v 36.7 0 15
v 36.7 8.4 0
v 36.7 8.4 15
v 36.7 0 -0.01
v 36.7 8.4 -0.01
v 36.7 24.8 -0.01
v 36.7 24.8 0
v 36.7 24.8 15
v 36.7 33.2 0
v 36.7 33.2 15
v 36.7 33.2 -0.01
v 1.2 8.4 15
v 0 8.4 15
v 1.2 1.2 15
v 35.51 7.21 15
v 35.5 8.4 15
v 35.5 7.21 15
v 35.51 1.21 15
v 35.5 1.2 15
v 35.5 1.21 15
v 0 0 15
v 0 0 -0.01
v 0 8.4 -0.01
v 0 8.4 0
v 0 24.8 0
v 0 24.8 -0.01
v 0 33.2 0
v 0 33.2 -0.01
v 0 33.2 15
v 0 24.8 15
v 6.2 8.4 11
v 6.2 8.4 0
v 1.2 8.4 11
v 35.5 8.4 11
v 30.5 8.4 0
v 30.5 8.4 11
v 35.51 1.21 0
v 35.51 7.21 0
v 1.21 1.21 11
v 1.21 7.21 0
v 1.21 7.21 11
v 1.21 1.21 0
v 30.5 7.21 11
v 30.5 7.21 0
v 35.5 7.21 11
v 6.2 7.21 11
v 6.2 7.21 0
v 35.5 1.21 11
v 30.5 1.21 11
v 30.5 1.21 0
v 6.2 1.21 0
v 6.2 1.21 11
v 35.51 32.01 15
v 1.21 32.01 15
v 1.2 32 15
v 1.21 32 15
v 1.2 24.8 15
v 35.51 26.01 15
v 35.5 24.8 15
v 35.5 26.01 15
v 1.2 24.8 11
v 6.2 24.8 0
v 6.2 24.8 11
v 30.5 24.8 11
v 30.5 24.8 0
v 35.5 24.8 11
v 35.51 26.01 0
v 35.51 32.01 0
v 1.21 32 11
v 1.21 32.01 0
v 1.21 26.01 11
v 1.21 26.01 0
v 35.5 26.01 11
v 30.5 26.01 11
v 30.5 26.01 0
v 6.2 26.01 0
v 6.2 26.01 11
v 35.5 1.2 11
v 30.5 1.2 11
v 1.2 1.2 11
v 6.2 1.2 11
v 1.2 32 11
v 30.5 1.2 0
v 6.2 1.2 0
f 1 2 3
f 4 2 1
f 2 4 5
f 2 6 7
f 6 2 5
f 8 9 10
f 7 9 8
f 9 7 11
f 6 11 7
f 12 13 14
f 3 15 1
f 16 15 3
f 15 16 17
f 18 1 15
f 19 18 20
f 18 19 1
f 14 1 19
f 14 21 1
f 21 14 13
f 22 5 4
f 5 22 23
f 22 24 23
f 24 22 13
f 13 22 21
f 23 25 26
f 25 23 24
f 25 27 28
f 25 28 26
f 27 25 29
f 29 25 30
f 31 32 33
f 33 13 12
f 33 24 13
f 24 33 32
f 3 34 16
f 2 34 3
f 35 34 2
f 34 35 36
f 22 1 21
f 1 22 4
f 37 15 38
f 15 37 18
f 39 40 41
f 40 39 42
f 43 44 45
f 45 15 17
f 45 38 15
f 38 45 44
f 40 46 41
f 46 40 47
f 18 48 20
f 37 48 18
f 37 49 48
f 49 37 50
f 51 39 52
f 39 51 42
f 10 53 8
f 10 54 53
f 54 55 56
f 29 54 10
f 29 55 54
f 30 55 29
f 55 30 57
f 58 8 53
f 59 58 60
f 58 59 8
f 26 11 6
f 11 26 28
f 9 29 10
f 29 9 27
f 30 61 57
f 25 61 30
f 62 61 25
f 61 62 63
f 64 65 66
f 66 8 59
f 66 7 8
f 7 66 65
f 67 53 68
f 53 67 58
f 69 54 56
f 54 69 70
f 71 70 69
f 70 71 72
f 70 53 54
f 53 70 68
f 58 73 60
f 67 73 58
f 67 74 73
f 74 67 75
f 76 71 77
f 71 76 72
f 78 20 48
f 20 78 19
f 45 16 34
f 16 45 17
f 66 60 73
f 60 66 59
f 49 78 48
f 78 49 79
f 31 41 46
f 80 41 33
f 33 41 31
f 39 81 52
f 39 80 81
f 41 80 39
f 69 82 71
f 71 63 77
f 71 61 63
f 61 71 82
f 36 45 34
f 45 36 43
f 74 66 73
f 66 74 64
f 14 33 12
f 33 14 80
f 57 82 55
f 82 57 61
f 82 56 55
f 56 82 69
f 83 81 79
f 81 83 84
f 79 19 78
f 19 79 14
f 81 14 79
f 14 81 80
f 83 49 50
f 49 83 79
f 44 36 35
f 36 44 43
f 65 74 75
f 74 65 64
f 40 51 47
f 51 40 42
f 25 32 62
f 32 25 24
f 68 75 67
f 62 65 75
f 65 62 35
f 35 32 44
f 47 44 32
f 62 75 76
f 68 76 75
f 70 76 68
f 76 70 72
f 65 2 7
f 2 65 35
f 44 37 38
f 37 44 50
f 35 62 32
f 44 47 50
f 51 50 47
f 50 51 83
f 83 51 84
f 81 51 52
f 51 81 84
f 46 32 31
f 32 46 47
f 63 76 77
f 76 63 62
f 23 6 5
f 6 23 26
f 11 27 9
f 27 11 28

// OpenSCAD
// file: ../Base/Rotation.scad
// Fischertechnik Box Foundation
// Geometry Helpers Rotation

include <PlacementOptions.scad>

// getRotatedSpace(space, rotation=NoRotation)
// Rotates the space dependent on the specified rotation

function getRotatedSpace(space, rotation=NoRotation) = [
    (rotation == Rotate90 || rotation == Rotate270) ? space.y : space.x,
    (rotation == Rotate90 || rotation == Rotate270) ? space.x : space.y
];

// Rotates the given space around the fixed left lower corner
// space = the space the children needs as width/depth list [width,depth]
// rotation = 0 Rotate0 degrees, 1 Rotate90 degrees, 2 Rotate180 degrees, 3 Rotate270 degrees (equivalent to -90)

module RotateFix(space, rotation=NoRotation) {
    dy = (rotation == Rotate0 || rotation == Rotate270) ? 0 :
        (rotation == Rotate90) ? space.x :
        space.y;
    dx = (rotation < Rotate180) ? 0 :
        (rotation == Rotate180) ? space.x :
        space.y;
    
    translate([dx, dy, 0])
        rotate([0, 0, rotations[rotation]])
            children();
}
// file: ../Base/Alignment.scad
// Fischertechnik Box Foundation
// Geometry Helpers Alignment

include <PlacementOptions.scad>

// getAlignedX(elementWidth, spaceWidth, align=AlignRight, offset=0)
// Gets the aligned X offset of an element with the given
// width in the given space.
// elementWidth = The width of the element to positon
// spaceWidth = The space where the element should be aligned
// align = 0 AlignLeft, 1 AlignCenter, 2 AlignRight
// offset = an optional offset from the aligned position. When
// aligned left or centered, then positive values are in X direction.
// When aligned right then positive values are in negative X direction.

function getAlignedX(elementWidth, spaceWidth, align=AlignRight, offset=0) =
    (align == AlignLeft) ?
        offset :
        ((align == AlignCenter) ?
        (spaceWidth - elementWidth)/2 + offset :
        spaceWidth - offset - elementWidth);

// getAlignedY(elementDepth, spaceDepth, align=AlignTop, offset=0)
// Gets the aligned Y offset of an element with the given
// depth in the given space.
// elementDepth = The depth of the element to positon
// spaceDepth = The space where the element should be aligned
// align = 0 AlignBottom, 1 AlignCenter, 2 AlignTop
// offset = an optional offset from the aligned position. When
// aligned bottom or centered, then positive values are in Y direction.
// When aligned top then positive values are in negative Y direction.

function getAlignedY(elementDepth, spaceDepth, align=AlignTop, offset=0) =
    (align == AlignBottom) ?
        offset :
        ((align == AlignCenter) ?
        (spaceDepth - elementDepth)/2 + offset :
        spaceDepth - offset - elementDepth);
// file: ../Base/PlacementOptions.scad
// Fischertechnik Box Foundation
// Placement Options

// Alignment
NoAlign = 0;
AlignLeft = 1;
AlignBottom = 2;
AlignCenter = 3;
AlignRight = 4;
AlignTop = 5;

// Element rotation degree steps
rotations = [0, -90, -180, -270];

// Rotation
NoRotation = 0;
Rotate0 = 0;
Rotate90 = 1;
Rotate180 = 2;
Rotate270 = 3;

// Docking (seen from above)
NoDock = -1;
DockLeft = 0;
DockTop = 1;
DockRight = 2;
DockCorner = 2;
DockBottom = 3;

// Web corners
LowerLeft = 0;
UpperLeft = 1;
UpperRight = 2;
LowerRight = 3;

// Web position relative to corner
LeftOfCorner = 0;
RightOfCorner = 1;
// file: ../Base/Boxes.scad
// Fischertechnik Box Foundation
// Pre-designed Boxes

use <Constants.scad>

include <PlacementOptions.scad>

box190Width = 190;
box190Depth = 130;
box130Width = 130;
box130Depth = 95;

// Values are from an original ec3 box
topBottomDifference = 1.5;
outerHeight = 40;
baseThickness = 1.8;
innerHeight = outerHeight - baseThickness;
stackExcess = 5.7;
radius = 3.5;
wallThickness = 1.5;
tolerance = 0.2;

boxWallThickness = wallThickness;
boxBaseThickness = baseThickness;
boxWebWidth = 3.0;

// getBoxWallThickness()
// Gets the wall thickness of a Fischertechnik Box
function getBoxWallThickness() = boxWallThickness;

// getBoxUsageHeight(height = 38.2)
// Gets the usable height of a Fischertechnik box
// height = Outer height of the box from the bottom to the upper edge.
function getBoxUsageHeight(height = outerHeight) = height - baseThickness - stackExcess;

// getBoxInnerHeight()
// Gets the inner height of a Fischertechnik box, including the stack excess
function getBoxInnerHeight() = innerHeight;

// getBoxBaseThickness()
// Gets the thickness of the Fischertechnik box base.
function getBoxBaseThickness() = boxBaseThickness;

// getBoxWebWidth()
// Gets the width of a box web
function getBoxWebWidth() = boxWebWidth;

// getBox190Space()
// Gets the usable inner space of a Box 190 as an x/y-list
function getBox190Space() = [
    box190Width - 2*getBoxWallThickness() - topBottomDifference, 
    box190Depth - 2*getBoxWallThickness() - topBottomDifference ];

// RoundedCornerPlate(width, depth, height, radius)
// Creates a body plate with rounded corners for a box. Used
// also to create the complete box with the hull module.
// width = Width of the plate
// depth = depth of the plate 
// height = thickness of the plate
// radius = radius of the rounded corner
module RoundedCornerPlate(width, depth, height, radius) {
    translate([radius, radius])
    hull() {
        w = width-2*radius;
        d = depth-2*radius;
        cube([w, d, height]);
        cylinder(height, r=radius, $fn=getFragments());
        translate([w, 0])
            cylinder(height, r=radius, $fn=getFragments());
        translate([w, d])
            cylinder(height, r=radius, $fn=getFragments());
        translate([0, d])
            cylinder(height, r=radius, $fn=getFragments());
    }
}

// BoxBase(width, depth)
// Creates an empty stackable Fischertechnik compatible box
// width = Outer width of the box (190, 130, ...)
// depth = Outer depth of the box (130, 95, ...)

module BoxBase(width, depth, height=outerHeight) {    
    thinPlate = 0.01;

    innerHeight = height - baseThickness;    
    
    module Body(tolerance=tolerance) {
        hull() {
            // Bottom with tolerance to fit into the original boxes when stacked
            translate([-wallThickness+tolerance, -wallThickness+tolerance, -baseThickness])
                RoundedCornerPlate(width-topBottomDifference-2*tolerance, depth-topBottomDifference-2*tolerance, thinPlate, radius);
            
            // Top
            translate([-wallThickness-topBottomDifference/2, -wallThickness-topBottomDifference/2, innerHeight-thinPlate])
                RoundedCornerPlate(width, depth, thinPlate, radius);
         }
    }

    module Cutoff() {
        hull() {
            coWidth = width - 2*wallThickness;
            coDepth = depth - 2*wallThickness;
            
            // Bottom
            RoundedCornerPlate(coWidth-topBottomDifference, coDepth-topBottomDifference, thinPlate, radius);

            // Top
            translate([-topBottomDifference/2, -topBottomDifference/2, innerHeight+thinPlate]) 
                RoundedCornerPlate(coWidth, coDepth, thinPlate, radius);
        }
    }
    
    difference() {        
        Body();
        Cutoff();
        stackOffset = innerHeight - stackExcess;
        translate([0, 0, stackOffset + baseThickness])
            Body(tolerance=0);
    }
}

// Creates the Fischertechnik empty box 130x190 mm and places it at position 0,0
// 190x130 are the outer sizes, the inner space is slightly smaller. Use getBox190Space() to get the inner sizes.
// The box is positioned that the usable inner space is at the 0,0,0 position.

module Box190() {
    BoxBase(box190Width, box190Depth);
}

// Gets the usable inner space of a Box 130 as an x/y-list
function getBox130Space() = [
    box130Width - 2*getBoxWallThickness() - topBottomDifference, 
    box130Depth - 2*getBoxWallThickness() - topBottomDifference ];

// Creates the Fischertechnik empty box 95x130 mm and places it at position 0,0
// 190x130 are the outer sizes, the inner space is slightly smaller. Use getBox190Space() to get the inner sizes.
// The box is positioned that the usable inner space is at the 0,0,0 position.

module Box130() {
    BoxBase(box130Width, box130Depth);
}

// Creates a web at the specified box walls
// corner 0 = LowerLeft, 1 = UpperLeft, 2 = UpperRight, 3 = LowerRight
// side 0 = LeftOfCorner, 1 = RightOfCorner
// distance = Distance in mm from the corner
// boxSpace = inner width and depth of the box (default: Box 190)
// webWidth = length of the web (default is 3 mms)
// webThickness = thickness of the web (default is 1 mm)
// height = Height of the web (standard is getBoxUsageHeight())
// sink = How much of the web is sunk into the wall

module BoxWeb(
    corner, 
    side, 
    distance, 
    boxSpace=getBox190Space(), 
    webWidth=getBoxWebWidth(), 
    webThickness=1.0, 
    height=getBoxUsageHeight(),
    sink = getBoxWallThickness()/2) {
    width = (corner % 2 == 0) ? 
            (side == LeftOfCorner ? webWidth : webThickness) :
            (side == LeftOfCorner ? webThickness : webWidth);

    depth = (corner % 2 == 0) ? 
            (side == RightOfCorner ? webWidth : webThickness) :
            (side == RightOfCorner ? webThickness : webWidth);
    
    xDiff = corner == LowerLeft ? 
                (side == LeftOfCorner ? -sink : distance) :
            (corner == UpperLeft ?                
                (side == LeftOfCorner ? distance : -sink) :
            (corner == UpperRight ?
                (side == LeftOfCorner ? boxSpace.x-webWidth+sink : boxSpace.x-distance-webThickness) :
                (side == LeftOfCorner ? boxSpace.x-distance-webThickness: boxSpace.x-webWidth+sink)));

    yDiff = corner == LowerLeft ? 
                (side == RightOfCorner ? -sink : distance) :
            (corner == UpperLeft ?
                (side == RightOfCorner ? boxSpace.y-distance-webThickness : boxSpace.y-webWidth+sink) :
            (corner == UpperRight ?
                (side == RightOfCorner ? boxSpace.y-webWidth+sink : boxSpace.y-distance-webThickness) :
                (side == RightOfCorner ? distance : -sink)));
    
    translate([xDiff, yDiff, -getExcess()])
        cube([width, depth, height + 2*getExcess()]);
}
// file: ../Base/Placement.scad
// Fischertechnik Box Foundation
// Geometry Helpers Placement

use <Constants.scad>
use <Alignment.scad>
use <Rotation.scad>
use <Boxes.scad>

include <PlacementOptions.scad>

// Place(x=0, y=0, elementSpace=[0,0], alignX=AlignLeft, alignY=AlignBottom, rotation=Rotate0, boxSpace=getBox190Space())
// Places the child at the specified position
// y = Y-Position. This is a relative position when an X aligment is specified.
// x = X-Position. This is a relative position when an Y aligment is specified.
// elementSpace = space of the element to be placed [x,y]
// alignX = -1=NoAlign, 0 AlignLeft, 1 AlignCenter, 3 AlignRight (elementSpace and boxSpace required!)
// alignY = -1=NoAlign, 2 AlignBottom, 1 AlignCenter, 4 AlignTop (elementSpace and boxSpace required!)
// rotation = 0 Rotate0 0 degrees, 1 Rotate90 90 degrees, 
// 2 Rotate180 180 degrees, 3 Rotate270 270 degrees (equivalent to -90)
// boxSpace = Inner space of the box where the placement occurs [x,y] - default is Box 190x130 inner space

module Place(x=0, y=0, elementSpace=[0,0], 
  alignX=AlignLeft, alignY=AlignBottom, 
  rotation=NoRotation, boxSpace=getBox190Space()) {

    module Position(x, y, space, rotation=Rotate0) {
        translate([x, y, 0])
            RotateFix(space, rotation)
                children();
    }

    space = getRotatedSpace(elementSpace, rotation);
    alignedX = getAlignedX(space.x, boxSpace.x, alignX, x);
    alignedY = getAlignedY(space.y, boxSpace.y, alignY, y);
    Position(alignedX, alignedY, elementSpace, rotation)
        children();
}

// Center(space=getBox130Space(), elementSpace=[0,0])
// space = Space where the children is centered. For cylinder use centered=true and no elementSpace.
// elementSpace = space of the element to be centered [x,y]

module Center(space=getBox190Space(), elementSpace=[0,0]) {
    Place(elementSpace=elementSpace, boxSpace=space, alignX=AlignCenter, alignY=AlignCenter)
        children();
}

// CenterHorizontal(width=0, y=0, offset=0, space=getBox130Space())
// width = Width of the element to be placed.
// y = Y position of the element
// offset = Offset from the center position (negative will be left of the center)
// space = Space where the element is placed

module CenterHorizontal(width=0, y=0, offset=0, space=getBox190Space()) {
    Place(x=offset, y=y, elementSpace=[width, 0], boxSpace=space, alignX=AlignCenter)
        children(0);
}

// CenterVertical(depth=0, x=0, offset=0, space=getBox130Space())
// depth = Depth of the element to be placed.
// x = X position of the element
// offset = Offset from the center position (negative will be down of the center)
// space = Space where the element is placed

module CenterVertical(depth=0, x=0, offset=0, space=getBox190Space()) {
    Place(x=x, y=offset, elementSpace=[0, depth], boxSpace=space, alignY=AlignCenter)
        children(0);
}

// getIsVertical(align)
// True if the specified alignment needs a vertical orientation for a divider (AlignRight, AlignLeft)

function getIsVertical(align) = (align == AlignRight || align == AlignLeft);

// getIsHorizontal(align)
// True if the specified alignment needs a horizontal orientation for a divider (AlignTop, AlignBottom)

function getIsHorizontal(align) = (align == AlignTop || align == AlignBottom);
// file: ../Base/Constants.scad
// Fischertechnik Box Foundation
// Constants

// Constant values necessary for multiple elements

// Base constants
dividerThickness = 1.2;
excess = 0.01;
fragments = 90;
tolerance = 0.8;

// Gets the thickness of a divider 
function getDividerThickness() = dividerThickness;

// Gets the excess that is used to merge walls into each other
function getExcess() = excess;

// Gets amount of fragments of a cylinder
function getFragments() = fragments;

// Gets the inner tolerance of a frame to each side
function getTolerance() = tolerance;


// Fischertechnik specific constants
axisDiameter = 4;
axisBottomDiameter = axisDiameter + 1;
axisTolerance = 0.2;

// Gets axis diameter of Fischertechnik axis
function getAxisDiameter() = axisDiameter;

// Gets axis diameter tolerance (subtracted for element axis)
function getAxisTolerance() = axisTolerance;

// Gets the axis diameter for standing axis
function getStandAxisDiameter() = getAxisDiameter() - getAxisTolerance();

// Gets axis bottom diameter for thicker part at the bottom
function getAxisBottomDiameter() = axisBottomDiameter;

pinHeight = 2.5;

// gets the height of a connecting pin
function getPinHeight() = pinHeight;

standardEdgeDistance = 2.5;
standardWebDistance = 11.5;
standardCornerLength = 15;

// gets the standard distance to the wall of the box for dockable frames with webs
function getStandardEdgeDistance() = standardEdgeDistance;

// gets the standard distance of each web to the corner of the dockable frame
function getStandardWebDistance() = standardWebDistance;

// gets the standard length of the corner walls of a dockable frame
function getStandardCornerLength() = standardCornerLength;

tubeWallFactor = 0.8;

// gets the wall thickness of a tube.
function getTubeWallThickness() = tubeWallFactor * getDividerThickness();

smallPartsFrameHeight = 20;

// gets the frame height for docked small parts boxes.
function getSmallPartsFrameHeight() = smallPartsFrameHeight;

hubRingDiameter = 19.5;
hubRingLevelDiameter = 21;

// gets the diameter of a tube matching the inner ring of a wheel
function getHubRingDiameter() = hubRingDiameter;

// gets the diameter of a hub tube with a thicker diameter
function getHubRingLevelDiameter() = hubRingLevelDiameter;
// main file
// Fischertechnik Box Library
// Frame for Pinhole, Slit Aperture, and Cross Aperture
// 31371, 31372, 31373 

use <../ModelBase/Simple.scad>
use <../ModelBase/Complex.scad>

/* [Hidden] */
width = 33.5;
depth = 30;
height = 4;

// getFrameApertureSpace()
// Gets the outer space the aperture frame needs.

function getFrameApertureSpace() = getFrameOuterVolume([width, depth, height]);

// FrameAperture()
// Frame for 30 mm flat slit or cross aperture.

module FrameAperture() {
    FrameSpecialFlat([width, depth, height]);
}

// Tests
color("lightgray") {
FrameAperture();
}
